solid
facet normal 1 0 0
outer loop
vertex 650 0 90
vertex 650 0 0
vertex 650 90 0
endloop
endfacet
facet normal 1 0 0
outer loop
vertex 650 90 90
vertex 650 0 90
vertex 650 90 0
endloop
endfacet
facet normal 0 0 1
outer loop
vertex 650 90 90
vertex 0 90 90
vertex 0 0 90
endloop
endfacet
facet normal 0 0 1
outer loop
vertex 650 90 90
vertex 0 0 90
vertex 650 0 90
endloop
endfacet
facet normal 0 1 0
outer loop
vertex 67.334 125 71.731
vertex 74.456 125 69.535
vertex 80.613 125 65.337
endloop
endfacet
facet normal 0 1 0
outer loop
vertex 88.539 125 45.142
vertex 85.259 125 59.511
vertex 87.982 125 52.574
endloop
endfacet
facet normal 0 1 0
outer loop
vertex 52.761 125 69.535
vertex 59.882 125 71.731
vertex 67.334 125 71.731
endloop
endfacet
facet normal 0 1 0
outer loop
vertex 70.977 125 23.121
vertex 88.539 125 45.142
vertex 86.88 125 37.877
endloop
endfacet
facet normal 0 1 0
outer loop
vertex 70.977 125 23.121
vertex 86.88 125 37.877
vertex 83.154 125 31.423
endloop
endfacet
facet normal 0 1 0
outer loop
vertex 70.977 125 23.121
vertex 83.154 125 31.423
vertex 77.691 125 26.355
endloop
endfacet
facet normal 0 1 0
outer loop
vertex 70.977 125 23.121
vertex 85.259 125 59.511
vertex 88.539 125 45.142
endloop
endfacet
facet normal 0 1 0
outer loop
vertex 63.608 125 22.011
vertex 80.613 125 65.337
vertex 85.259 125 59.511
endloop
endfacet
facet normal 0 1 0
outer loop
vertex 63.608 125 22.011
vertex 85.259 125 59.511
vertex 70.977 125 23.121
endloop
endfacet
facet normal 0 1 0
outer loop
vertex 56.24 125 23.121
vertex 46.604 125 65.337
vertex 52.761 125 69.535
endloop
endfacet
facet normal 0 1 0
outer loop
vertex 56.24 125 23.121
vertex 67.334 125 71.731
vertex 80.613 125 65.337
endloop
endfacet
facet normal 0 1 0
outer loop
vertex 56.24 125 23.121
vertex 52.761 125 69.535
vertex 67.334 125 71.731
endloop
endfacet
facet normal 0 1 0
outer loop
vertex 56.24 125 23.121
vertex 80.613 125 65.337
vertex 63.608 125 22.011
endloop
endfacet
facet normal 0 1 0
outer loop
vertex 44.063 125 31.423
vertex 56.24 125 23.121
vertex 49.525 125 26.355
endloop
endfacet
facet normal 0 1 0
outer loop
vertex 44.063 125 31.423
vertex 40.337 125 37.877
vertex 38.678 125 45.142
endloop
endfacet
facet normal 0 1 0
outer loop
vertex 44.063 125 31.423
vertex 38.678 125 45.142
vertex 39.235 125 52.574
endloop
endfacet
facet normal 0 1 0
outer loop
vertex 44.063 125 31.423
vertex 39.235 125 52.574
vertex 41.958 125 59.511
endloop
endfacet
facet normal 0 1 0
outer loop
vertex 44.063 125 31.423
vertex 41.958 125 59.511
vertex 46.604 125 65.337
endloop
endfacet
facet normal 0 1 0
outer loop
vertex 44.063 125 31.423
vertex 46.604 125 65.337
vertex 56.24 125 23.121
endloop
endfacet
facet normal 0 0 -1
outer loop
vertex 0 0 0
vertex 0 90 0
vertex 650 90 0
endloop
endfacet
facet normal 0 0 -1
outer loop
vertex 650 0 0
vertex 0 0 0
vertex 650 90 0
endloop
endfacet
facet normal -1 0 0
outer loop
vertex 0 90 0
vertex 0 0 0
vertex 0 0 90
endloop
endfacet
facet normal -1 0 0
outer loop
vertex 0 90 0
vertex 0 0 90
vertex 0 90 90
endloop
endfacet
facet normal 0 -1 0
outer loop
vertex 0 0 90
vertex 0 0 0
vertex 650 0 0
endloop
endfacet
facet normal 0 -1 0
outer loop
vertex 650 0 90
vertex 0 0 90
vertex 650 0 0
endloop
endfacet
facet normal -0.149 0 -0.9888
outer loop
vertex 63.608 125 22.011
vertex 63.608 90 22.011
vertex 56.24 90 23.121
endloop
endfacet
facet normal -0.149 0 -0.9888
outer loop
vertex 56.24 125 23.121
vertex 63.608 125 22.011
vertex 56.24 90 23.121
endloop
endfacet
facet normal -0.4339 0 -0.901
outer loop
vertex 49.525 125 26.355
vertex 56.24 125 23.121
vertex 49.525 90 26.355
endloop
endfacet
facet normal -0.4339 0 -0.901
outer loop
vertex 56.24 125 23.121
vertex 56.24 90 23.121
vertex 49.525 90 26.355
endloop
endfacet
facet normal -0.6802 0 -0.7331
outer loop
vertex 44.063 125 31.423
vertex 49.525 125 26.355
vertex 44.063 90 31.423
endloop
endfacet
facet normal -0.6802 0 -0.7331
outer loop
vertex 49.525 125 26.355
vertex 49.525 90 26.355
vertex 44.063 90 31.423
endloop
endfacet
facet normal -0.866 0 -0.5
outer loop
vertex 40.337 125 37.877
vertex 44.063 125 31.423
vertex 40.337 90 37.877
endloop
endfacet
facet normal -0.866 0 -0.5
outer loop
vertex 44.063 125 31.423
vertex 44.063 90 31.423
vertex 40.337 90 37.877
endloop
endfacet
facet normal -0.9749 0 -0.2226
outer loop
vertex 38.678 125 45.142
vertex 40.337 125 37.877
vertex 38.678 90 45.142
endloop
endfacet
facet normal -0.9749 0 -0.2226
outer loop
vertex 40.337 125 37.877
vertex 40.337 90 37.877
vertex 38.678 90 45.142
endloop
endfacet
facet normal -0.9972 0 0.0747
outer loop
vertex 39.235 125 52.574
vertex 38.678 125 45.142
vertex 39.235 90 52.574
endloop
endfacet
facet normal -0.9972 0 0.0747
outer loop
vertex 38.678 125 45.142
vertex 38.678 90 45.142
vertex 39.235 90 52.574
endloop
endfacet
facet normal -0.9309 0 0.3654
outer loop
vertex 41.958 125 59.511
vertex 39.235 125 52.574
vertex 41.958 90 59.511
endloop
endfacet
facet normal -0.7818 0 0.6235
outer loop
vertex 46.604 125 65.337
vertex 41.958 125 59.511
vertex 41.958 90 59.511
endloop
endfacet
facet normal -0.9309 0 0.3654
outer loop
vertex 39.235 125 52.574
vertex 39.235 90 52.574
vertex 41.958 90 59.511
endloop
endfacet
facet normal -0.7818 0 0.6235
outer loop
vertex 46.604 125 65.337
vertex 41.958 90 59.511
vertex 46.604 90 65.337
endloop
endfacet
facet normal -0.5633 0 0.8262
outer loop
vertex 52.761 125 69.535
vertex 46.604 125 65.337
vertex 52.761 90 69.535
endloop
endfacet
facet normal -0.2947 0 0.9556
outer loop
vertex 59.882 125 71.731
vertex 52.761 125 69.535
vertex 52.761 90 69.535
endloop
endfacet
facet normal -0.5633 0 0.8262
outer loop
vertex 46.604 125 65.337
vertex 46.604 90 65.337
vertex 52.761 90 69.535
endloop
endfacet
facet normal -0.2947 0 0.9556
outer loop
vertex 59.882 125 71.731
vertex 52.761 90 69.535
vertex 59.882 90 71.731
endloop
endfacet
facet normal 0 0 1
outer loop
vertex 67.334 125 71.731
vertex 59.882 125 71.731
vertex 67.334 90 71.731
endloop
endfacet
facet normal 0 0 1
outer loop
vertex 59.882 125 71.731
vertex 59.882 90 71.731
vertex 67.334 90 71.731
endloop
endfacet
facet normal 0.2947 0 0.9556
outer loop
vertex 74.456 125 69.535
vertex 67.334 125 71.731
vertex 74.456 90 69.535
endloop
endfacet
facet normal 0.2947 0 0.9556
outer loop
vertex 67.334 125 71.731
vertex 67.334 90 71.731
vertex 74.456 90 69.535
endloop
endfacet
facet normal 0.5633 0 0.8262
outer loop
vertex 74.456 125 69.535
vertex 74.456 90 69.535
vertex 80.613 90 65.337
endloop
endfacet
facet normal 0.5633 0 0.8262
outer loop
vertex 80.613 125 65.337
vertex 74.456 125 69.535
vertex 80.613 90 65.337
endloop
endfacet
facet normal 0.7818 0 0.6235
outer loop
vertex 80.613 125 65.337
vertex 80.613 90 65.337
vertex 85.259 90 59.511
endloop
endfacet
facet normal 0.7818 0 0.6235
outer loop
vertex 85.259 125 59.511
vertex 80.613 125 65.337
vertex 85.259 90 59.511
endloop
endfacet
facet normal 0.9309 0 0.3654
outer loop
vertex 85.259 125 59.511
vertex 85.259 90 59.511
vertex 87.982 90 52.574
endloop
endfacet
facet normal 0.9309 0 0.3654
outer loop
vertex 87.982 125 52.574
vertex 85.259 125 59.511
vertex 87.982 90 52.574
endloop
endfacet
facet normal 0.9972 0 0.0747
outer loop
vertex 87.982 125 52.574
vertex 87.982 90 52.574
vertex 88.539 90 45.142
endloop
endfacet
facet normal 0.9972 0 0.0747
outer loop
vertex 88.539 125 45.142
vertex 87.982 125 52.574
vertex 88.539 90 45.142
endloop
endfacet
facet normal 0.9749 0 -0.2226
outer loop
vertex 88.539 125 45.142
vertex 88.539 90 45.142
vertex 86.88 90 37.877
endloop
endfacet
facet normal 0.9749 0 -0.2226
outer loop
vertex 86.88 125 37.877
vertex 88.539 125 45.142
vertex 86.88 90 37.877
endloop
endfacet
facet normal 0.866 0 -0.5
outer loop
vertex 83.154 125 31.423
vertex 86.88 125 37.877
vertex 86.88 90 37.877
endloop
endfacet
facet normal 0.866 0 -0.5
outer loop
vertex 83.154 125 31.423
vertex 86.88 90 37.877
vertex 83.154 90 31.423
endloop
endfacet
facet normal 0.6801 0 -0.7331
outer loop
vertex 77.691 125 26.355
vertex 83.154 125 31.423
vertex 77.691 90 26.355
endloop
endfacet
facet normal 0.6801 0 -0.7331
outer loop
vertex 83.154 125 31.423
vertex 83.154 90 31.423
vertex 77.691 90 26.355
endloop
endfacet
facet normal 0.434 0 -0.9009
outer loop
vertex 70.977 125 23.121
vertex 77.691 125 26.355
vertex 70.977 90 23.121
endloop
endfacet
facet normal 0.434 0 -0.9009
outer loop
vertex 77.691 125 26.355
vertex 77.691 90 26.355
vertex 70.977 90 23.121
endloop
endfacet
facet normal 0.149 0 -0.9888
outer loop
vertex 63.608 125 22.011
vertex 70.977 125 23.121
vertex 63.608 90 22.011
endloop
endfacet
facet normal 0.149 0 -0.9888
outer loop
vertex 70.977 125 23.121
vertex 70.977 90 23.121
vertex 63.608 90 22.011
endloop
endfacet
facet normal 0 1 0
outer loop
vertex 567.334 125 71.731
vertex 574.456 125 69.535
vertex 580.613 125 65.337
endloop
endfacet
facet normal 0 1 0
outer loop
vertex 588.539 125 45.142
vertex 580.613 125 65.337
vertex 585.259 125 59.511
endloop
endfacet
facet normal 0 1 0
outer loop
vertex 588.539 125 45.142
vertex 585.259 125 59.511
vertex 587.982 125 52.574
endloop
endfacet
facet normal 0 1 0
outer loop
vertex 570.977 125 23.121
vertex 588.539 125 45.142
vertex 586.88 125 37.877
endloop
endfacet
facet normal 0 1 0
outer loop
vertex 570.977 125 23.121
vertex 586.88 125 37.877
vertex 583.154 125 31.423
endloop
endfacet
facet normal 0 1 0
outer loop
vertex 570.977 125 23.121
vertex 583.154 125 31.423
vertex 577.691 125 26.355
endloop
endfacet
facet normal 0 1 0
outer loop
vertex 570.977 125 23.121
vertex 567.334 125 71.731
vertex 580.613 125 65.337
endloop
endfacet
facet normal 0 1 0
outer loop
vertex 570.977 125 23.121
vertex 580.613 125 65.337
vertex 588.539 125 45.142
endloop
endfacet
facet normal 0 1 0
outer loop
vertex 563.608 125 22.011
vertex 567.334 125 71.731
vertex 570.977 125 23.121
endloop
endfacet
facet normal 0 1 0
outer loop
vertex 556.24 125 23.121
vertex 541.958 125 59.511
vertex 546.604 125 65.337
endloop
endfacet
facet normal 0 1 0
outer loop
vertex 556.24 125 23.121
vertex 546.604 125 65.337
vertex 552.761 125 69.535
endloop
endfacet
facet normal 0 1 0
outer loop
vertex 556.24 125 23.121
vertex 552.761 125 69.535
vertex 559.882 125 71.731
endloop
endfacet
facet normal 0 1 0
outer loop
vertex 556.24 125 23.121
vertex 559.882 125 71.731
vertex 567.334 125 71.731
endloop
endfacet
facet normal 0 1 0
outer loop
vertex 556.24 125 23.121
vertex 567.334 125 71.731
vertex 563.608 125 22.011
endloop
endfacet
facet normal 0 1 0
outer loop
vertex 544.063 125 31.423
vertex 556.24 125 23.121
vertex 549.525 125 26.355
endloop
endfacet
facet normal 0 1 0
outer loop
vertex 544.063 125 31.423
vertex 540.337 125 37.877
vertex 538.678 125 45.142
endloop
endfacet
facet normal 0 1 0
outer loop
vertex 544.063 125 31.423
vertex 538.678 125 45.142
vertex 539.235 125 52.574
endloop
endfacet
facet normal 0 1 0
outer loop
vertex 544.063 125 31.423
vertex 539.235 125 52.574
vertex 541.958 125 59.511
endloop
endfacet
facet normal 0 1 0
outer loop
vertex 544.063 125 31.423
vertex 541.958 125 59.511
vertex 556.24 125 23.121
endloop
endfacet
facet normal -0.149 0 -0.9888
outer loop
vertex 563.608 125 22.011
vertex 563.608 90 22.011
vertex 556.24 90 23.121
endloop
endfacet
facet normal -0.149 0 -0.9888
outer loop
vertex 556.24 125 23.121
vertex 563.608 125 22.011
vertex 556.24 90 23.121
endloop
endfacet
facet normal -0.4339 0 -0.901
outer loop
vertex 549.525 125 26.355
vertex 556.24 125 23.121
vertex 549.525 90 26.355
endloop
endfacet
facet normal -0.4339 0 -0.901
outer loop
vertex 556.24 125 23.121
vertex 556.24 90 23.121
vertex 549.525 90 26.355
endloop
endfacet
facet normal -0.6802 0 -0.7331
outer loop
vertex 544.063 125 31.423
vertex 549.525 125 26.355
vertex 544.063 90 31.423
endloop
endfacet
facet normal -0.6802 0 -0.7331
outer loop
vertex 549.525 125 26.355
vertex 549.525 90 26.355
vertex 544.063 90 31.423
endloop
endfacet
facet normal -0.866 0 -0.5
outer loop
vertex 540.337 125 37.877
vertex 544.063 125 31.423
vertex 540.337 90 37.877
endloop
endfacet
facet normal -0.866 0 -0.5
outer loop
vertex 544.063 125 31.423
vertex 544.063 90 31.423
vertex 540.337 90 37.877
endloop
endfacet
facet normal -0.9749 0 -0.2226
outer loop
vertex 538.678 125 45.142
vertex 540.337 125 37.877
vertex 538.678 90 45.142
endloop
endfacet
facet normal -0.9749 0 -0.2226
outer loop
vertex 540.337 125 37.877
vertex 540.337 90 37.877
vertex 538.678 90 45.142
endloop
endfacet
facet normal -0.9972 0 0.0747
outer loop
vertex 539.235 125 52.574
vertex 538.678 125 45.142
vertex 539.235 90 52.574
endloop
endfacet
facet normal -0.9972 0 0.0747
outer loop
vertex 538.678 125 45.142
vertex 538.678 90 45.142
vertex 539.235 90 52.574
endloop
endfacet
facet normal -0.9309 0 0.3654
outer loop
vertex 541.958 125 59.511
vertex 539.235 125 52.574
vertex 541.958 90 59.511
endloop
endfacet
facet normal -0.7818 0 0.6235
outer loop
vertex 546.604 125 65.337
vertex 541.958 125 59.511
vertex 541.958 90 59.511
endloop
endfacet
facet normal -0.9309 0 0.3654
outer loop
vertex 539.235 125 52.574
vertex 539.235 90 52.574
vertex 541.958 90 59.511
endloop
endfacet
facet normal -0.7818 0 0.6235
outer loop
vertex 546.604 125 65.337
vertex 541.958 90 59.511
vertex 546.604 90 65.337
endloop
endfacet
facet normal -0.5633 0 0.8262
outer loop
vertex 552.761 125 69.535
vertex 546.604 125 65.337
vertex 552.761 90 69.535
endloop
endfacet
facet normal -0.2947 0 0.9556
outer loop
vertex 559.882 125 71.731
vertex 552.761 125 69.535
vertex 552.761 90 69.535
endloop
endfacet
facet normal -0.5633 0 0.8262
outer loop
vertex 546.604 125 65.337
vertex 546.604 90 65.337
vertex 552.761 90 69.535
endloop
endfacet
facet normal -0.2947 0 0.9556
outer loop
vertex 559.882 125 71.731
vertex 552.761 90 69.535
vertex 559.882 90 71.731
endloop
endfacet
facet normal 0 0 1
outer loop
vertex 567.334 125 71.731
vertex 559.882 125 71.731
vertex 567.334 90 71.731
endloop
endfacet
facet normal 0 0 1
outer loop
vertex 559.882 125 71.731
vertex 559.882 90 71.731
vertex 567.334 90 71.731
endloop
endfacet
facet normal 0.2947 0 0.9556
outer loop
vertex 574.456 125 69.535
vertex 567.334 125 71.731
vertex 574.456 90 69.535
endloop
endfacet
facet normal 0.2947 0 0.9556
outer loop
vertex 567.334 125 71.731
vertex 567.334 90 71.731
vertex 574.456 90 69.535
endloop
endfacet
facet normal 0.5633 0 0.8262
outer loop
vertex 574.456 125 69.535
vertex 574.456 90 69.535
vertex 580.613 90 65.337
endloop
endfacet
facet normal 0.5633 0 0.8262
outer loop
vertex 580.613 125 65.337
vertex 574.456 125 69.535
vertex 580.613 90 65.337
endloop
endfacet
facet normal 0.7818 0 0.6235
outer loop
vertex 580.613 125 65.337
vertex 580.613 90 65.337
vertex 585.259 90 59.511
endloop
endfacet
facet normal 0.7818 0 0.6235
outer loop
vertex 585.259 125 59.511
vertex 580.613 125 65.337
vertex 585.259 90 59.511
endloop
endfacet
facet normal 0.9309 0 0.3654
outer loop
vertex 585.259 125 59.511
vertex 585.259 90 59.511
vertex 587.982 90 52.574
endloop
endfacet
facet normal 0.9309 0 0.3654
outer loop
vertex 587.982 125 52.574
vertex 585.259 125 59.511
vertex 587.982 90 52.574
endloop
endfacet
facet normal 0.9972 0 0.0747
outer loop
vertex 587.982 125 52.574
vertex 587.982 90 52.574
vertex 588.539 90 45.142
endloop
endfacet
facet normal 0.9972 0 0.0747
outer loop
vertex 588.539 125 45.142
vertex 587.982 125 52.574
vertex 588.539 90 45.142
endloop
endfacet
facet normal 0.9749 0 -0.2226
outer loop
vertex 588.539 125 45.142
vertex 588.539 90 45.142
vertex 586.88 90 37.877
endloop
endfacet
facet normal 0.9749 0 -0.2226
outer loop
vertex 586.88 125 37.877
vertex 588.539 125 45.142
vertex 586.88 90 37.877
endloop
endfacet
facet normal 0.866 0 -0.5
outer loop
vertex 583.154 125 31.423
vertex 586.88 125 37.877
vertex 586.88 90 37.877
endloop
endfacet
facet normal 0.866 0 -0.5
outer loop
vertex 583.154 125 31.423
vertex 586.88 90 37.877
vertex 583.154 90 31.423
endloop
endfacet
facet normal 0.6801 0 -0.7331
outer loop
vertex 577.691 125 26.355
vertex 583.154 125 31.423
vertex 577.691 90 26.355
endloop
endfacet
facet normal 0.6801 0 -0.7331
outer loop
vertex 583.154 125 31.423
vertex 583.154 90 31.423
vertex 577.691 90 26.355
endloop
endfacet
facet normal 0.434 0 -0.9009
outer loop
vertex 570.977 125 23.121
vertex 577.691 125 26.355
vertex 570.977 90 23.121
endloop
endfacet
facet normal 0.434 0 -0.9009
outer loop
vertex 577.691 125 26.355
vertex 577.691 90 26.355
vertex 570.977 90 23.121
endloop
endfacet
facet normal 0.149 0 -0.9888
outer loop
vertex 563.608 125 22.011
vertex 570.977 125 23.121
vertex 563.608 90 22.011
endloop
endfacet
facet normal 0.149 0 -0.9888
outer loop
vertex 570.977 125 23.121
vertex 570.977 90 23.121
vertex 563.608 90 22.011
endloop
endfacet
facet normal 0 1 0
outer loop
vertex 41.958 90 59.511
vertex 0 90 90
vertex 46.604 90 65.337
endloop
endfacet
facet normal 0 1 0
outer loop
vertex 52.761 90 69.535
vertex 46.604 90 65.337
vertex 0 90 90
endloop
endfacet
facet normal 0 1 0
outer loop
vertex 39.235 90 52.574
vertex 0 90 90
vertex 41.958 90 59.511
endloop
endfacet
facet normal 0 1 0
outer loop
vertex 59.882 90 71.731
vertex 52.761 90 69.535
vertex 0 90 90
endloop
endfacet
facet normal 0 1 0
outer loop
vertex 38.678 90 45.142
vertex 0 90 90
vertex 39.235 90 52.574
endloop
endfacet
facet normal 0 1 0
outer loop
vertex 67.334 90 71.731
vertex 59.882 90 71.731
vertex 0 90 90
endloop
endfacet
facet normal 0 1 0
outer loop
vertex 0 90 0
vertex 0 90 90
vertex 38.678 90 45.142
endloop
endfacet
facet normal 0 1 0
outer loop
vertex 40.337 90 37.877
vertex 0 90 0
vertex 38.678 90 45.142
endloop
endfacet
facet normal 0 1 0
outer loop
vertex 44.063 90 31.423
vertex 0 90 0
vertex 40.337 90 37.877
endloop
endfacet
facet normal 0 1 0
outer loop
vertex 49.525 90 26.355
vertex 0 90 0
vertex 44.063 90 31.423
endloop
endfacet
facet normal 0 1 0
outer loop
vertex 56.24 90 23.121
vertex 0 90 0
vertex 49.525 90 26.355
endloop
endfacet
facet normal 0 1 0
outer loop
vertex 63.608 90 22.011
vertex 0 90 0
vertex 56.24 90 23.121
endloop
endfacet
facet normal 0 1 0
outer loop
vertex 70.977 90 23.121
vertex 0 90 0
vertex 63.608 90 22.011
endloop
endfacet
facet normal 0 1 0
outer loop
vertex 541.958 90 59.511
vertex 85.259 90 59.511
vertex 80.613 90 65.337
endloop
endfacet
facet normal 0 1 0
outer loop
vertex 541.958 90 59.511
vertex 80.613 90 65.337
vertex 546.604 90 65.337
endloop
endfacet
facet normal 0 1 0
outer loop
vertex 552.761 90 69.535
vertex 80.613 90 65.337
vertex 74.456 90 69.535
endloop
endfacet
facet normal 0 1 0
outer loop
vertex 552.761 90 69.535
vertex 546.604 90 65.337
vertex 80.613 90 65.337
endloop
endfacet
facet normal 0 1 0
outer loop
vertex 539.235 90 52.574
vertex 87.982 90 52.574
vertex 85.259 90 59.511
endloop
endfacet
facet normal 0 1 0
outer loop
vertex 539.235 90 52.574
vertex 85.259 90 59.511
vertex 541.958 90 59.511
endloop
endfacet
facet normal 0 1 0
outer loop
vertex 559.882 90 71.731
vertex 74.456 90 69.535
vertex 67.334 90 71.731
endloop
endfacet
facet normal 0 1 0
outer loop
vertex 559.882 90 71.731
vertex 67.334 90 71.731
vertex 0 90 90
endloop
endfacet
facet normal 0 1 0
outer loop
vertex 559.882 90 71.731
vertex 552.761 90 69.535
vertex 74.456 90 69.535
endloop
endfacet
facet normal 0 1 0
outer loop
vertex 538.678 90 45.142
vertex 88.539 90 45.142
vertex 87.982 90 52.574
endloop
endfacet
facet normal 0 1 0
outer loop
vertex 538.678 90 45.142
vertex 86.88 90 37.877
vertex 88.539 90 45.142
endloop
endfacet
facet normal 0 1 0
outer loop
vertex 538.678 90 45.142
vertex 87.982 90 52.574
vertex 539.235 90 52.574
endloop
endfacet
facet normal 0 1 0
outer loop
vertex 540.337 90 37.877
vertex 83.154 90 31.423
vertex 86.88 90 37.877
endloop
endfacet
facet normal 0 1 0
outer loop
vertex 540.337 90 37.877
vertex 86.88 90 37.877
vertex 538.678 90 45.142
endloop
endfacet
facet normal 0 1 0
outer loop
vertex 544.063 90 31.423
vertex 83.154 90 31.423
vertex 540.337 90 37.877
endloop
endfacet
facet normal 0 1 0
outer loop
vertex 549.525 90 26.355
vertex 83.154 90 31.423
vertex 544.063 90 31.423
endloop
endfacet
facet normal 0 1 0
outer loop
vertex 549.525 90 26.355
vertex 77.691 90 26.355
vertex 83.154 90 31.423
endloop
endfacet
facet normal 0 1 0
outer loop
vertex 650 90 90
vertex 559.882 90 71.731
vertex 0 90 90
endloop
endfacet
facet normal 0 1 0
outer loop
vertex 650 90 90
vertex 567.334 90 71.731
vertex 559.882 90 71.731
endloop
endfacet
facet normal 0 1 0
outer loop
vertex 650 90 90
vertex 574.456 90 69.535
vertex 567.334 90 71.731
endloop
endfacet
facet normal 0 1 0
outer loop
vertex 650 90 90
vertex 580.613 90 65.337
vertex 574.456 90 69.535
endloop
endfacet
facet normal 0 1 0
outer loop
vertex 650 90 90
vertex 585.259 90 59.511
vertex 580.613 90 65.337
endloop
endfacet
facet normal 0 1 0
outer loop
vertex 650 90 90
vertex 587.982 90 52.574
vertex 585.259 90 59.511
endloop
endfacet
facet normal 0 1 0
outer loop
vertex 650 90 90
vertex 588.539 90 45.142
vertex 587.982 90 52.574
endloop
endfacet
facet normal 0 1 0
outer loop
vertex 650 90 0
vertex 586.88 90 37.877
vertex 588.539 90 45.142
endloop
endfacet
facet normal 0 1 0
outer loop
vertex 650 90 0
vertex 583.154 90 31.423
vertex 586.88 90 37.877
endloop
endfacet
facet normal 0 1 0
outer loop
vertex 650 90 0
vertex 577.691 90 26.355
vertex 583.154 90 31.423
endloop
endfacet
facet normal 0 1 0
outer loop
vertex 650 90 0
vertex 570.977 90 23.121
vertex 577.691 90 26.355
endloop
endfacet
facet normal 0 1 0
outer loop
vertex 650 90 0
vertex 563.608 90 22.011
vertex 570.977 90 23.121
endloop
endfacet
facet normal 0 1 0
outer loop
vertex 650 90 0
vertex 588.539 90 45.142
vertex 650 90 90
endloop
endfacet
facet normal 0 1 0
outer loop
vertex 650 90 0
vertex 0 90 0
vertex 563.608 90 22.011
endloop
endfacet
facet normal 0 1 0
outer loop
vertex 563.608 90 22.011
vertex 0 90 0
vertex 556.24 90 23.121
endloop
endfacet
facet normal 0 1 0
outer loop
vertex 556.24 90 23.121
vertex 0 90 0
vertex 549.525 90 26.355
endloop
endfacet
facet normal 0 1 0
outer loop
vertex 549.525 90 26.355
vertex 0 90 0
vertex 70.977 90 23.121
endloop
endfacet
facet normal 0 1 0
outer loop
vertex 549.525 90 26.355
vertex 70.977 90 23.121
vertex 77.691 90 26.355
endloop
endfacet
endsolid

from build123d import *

# Parameters (mm, degrees)
SKETCH1_W           = 650
SKETCH1_H           = 90
BOSS_EXTRUDE1_DEPTH = 90
SKETCH2_R           = 25
BOSS_EXTRUDE2_DEPTH = 35


with BuildPart() as part:
    # Sketch1 → Boss-Extrude1 (new body)
    with BuildSketch(Plane.XY):
        with Locations((325, 45)):
            Rectangle(SKETCH1_W, SKETCH1_H)
    extrude(amount=BOSS_EXTRUDE1_DEPTH)

    # Sketch2 → Boss-Extrude2 (add)
    with BuildSketch(Plane(origin=(0, 90, 0), x_dir=(1, 0, 0), z_dir=(0, 1, 0))):
        with Locations(Location((63.60842931, -47.01070439, 0), (0, 0, 90))):  # turned: the seam where the file's is
            Circle(SKETCH2_R)
        with Locations(Location((563.60842931, -47.01070439, 0), (0, 0, 90))):  # turned: the seam where the file's is
            Circle(SKETCH2_R)
    extrude(amount=BOSS_EXTRUDE2_DEPTH)


solid = part.part
